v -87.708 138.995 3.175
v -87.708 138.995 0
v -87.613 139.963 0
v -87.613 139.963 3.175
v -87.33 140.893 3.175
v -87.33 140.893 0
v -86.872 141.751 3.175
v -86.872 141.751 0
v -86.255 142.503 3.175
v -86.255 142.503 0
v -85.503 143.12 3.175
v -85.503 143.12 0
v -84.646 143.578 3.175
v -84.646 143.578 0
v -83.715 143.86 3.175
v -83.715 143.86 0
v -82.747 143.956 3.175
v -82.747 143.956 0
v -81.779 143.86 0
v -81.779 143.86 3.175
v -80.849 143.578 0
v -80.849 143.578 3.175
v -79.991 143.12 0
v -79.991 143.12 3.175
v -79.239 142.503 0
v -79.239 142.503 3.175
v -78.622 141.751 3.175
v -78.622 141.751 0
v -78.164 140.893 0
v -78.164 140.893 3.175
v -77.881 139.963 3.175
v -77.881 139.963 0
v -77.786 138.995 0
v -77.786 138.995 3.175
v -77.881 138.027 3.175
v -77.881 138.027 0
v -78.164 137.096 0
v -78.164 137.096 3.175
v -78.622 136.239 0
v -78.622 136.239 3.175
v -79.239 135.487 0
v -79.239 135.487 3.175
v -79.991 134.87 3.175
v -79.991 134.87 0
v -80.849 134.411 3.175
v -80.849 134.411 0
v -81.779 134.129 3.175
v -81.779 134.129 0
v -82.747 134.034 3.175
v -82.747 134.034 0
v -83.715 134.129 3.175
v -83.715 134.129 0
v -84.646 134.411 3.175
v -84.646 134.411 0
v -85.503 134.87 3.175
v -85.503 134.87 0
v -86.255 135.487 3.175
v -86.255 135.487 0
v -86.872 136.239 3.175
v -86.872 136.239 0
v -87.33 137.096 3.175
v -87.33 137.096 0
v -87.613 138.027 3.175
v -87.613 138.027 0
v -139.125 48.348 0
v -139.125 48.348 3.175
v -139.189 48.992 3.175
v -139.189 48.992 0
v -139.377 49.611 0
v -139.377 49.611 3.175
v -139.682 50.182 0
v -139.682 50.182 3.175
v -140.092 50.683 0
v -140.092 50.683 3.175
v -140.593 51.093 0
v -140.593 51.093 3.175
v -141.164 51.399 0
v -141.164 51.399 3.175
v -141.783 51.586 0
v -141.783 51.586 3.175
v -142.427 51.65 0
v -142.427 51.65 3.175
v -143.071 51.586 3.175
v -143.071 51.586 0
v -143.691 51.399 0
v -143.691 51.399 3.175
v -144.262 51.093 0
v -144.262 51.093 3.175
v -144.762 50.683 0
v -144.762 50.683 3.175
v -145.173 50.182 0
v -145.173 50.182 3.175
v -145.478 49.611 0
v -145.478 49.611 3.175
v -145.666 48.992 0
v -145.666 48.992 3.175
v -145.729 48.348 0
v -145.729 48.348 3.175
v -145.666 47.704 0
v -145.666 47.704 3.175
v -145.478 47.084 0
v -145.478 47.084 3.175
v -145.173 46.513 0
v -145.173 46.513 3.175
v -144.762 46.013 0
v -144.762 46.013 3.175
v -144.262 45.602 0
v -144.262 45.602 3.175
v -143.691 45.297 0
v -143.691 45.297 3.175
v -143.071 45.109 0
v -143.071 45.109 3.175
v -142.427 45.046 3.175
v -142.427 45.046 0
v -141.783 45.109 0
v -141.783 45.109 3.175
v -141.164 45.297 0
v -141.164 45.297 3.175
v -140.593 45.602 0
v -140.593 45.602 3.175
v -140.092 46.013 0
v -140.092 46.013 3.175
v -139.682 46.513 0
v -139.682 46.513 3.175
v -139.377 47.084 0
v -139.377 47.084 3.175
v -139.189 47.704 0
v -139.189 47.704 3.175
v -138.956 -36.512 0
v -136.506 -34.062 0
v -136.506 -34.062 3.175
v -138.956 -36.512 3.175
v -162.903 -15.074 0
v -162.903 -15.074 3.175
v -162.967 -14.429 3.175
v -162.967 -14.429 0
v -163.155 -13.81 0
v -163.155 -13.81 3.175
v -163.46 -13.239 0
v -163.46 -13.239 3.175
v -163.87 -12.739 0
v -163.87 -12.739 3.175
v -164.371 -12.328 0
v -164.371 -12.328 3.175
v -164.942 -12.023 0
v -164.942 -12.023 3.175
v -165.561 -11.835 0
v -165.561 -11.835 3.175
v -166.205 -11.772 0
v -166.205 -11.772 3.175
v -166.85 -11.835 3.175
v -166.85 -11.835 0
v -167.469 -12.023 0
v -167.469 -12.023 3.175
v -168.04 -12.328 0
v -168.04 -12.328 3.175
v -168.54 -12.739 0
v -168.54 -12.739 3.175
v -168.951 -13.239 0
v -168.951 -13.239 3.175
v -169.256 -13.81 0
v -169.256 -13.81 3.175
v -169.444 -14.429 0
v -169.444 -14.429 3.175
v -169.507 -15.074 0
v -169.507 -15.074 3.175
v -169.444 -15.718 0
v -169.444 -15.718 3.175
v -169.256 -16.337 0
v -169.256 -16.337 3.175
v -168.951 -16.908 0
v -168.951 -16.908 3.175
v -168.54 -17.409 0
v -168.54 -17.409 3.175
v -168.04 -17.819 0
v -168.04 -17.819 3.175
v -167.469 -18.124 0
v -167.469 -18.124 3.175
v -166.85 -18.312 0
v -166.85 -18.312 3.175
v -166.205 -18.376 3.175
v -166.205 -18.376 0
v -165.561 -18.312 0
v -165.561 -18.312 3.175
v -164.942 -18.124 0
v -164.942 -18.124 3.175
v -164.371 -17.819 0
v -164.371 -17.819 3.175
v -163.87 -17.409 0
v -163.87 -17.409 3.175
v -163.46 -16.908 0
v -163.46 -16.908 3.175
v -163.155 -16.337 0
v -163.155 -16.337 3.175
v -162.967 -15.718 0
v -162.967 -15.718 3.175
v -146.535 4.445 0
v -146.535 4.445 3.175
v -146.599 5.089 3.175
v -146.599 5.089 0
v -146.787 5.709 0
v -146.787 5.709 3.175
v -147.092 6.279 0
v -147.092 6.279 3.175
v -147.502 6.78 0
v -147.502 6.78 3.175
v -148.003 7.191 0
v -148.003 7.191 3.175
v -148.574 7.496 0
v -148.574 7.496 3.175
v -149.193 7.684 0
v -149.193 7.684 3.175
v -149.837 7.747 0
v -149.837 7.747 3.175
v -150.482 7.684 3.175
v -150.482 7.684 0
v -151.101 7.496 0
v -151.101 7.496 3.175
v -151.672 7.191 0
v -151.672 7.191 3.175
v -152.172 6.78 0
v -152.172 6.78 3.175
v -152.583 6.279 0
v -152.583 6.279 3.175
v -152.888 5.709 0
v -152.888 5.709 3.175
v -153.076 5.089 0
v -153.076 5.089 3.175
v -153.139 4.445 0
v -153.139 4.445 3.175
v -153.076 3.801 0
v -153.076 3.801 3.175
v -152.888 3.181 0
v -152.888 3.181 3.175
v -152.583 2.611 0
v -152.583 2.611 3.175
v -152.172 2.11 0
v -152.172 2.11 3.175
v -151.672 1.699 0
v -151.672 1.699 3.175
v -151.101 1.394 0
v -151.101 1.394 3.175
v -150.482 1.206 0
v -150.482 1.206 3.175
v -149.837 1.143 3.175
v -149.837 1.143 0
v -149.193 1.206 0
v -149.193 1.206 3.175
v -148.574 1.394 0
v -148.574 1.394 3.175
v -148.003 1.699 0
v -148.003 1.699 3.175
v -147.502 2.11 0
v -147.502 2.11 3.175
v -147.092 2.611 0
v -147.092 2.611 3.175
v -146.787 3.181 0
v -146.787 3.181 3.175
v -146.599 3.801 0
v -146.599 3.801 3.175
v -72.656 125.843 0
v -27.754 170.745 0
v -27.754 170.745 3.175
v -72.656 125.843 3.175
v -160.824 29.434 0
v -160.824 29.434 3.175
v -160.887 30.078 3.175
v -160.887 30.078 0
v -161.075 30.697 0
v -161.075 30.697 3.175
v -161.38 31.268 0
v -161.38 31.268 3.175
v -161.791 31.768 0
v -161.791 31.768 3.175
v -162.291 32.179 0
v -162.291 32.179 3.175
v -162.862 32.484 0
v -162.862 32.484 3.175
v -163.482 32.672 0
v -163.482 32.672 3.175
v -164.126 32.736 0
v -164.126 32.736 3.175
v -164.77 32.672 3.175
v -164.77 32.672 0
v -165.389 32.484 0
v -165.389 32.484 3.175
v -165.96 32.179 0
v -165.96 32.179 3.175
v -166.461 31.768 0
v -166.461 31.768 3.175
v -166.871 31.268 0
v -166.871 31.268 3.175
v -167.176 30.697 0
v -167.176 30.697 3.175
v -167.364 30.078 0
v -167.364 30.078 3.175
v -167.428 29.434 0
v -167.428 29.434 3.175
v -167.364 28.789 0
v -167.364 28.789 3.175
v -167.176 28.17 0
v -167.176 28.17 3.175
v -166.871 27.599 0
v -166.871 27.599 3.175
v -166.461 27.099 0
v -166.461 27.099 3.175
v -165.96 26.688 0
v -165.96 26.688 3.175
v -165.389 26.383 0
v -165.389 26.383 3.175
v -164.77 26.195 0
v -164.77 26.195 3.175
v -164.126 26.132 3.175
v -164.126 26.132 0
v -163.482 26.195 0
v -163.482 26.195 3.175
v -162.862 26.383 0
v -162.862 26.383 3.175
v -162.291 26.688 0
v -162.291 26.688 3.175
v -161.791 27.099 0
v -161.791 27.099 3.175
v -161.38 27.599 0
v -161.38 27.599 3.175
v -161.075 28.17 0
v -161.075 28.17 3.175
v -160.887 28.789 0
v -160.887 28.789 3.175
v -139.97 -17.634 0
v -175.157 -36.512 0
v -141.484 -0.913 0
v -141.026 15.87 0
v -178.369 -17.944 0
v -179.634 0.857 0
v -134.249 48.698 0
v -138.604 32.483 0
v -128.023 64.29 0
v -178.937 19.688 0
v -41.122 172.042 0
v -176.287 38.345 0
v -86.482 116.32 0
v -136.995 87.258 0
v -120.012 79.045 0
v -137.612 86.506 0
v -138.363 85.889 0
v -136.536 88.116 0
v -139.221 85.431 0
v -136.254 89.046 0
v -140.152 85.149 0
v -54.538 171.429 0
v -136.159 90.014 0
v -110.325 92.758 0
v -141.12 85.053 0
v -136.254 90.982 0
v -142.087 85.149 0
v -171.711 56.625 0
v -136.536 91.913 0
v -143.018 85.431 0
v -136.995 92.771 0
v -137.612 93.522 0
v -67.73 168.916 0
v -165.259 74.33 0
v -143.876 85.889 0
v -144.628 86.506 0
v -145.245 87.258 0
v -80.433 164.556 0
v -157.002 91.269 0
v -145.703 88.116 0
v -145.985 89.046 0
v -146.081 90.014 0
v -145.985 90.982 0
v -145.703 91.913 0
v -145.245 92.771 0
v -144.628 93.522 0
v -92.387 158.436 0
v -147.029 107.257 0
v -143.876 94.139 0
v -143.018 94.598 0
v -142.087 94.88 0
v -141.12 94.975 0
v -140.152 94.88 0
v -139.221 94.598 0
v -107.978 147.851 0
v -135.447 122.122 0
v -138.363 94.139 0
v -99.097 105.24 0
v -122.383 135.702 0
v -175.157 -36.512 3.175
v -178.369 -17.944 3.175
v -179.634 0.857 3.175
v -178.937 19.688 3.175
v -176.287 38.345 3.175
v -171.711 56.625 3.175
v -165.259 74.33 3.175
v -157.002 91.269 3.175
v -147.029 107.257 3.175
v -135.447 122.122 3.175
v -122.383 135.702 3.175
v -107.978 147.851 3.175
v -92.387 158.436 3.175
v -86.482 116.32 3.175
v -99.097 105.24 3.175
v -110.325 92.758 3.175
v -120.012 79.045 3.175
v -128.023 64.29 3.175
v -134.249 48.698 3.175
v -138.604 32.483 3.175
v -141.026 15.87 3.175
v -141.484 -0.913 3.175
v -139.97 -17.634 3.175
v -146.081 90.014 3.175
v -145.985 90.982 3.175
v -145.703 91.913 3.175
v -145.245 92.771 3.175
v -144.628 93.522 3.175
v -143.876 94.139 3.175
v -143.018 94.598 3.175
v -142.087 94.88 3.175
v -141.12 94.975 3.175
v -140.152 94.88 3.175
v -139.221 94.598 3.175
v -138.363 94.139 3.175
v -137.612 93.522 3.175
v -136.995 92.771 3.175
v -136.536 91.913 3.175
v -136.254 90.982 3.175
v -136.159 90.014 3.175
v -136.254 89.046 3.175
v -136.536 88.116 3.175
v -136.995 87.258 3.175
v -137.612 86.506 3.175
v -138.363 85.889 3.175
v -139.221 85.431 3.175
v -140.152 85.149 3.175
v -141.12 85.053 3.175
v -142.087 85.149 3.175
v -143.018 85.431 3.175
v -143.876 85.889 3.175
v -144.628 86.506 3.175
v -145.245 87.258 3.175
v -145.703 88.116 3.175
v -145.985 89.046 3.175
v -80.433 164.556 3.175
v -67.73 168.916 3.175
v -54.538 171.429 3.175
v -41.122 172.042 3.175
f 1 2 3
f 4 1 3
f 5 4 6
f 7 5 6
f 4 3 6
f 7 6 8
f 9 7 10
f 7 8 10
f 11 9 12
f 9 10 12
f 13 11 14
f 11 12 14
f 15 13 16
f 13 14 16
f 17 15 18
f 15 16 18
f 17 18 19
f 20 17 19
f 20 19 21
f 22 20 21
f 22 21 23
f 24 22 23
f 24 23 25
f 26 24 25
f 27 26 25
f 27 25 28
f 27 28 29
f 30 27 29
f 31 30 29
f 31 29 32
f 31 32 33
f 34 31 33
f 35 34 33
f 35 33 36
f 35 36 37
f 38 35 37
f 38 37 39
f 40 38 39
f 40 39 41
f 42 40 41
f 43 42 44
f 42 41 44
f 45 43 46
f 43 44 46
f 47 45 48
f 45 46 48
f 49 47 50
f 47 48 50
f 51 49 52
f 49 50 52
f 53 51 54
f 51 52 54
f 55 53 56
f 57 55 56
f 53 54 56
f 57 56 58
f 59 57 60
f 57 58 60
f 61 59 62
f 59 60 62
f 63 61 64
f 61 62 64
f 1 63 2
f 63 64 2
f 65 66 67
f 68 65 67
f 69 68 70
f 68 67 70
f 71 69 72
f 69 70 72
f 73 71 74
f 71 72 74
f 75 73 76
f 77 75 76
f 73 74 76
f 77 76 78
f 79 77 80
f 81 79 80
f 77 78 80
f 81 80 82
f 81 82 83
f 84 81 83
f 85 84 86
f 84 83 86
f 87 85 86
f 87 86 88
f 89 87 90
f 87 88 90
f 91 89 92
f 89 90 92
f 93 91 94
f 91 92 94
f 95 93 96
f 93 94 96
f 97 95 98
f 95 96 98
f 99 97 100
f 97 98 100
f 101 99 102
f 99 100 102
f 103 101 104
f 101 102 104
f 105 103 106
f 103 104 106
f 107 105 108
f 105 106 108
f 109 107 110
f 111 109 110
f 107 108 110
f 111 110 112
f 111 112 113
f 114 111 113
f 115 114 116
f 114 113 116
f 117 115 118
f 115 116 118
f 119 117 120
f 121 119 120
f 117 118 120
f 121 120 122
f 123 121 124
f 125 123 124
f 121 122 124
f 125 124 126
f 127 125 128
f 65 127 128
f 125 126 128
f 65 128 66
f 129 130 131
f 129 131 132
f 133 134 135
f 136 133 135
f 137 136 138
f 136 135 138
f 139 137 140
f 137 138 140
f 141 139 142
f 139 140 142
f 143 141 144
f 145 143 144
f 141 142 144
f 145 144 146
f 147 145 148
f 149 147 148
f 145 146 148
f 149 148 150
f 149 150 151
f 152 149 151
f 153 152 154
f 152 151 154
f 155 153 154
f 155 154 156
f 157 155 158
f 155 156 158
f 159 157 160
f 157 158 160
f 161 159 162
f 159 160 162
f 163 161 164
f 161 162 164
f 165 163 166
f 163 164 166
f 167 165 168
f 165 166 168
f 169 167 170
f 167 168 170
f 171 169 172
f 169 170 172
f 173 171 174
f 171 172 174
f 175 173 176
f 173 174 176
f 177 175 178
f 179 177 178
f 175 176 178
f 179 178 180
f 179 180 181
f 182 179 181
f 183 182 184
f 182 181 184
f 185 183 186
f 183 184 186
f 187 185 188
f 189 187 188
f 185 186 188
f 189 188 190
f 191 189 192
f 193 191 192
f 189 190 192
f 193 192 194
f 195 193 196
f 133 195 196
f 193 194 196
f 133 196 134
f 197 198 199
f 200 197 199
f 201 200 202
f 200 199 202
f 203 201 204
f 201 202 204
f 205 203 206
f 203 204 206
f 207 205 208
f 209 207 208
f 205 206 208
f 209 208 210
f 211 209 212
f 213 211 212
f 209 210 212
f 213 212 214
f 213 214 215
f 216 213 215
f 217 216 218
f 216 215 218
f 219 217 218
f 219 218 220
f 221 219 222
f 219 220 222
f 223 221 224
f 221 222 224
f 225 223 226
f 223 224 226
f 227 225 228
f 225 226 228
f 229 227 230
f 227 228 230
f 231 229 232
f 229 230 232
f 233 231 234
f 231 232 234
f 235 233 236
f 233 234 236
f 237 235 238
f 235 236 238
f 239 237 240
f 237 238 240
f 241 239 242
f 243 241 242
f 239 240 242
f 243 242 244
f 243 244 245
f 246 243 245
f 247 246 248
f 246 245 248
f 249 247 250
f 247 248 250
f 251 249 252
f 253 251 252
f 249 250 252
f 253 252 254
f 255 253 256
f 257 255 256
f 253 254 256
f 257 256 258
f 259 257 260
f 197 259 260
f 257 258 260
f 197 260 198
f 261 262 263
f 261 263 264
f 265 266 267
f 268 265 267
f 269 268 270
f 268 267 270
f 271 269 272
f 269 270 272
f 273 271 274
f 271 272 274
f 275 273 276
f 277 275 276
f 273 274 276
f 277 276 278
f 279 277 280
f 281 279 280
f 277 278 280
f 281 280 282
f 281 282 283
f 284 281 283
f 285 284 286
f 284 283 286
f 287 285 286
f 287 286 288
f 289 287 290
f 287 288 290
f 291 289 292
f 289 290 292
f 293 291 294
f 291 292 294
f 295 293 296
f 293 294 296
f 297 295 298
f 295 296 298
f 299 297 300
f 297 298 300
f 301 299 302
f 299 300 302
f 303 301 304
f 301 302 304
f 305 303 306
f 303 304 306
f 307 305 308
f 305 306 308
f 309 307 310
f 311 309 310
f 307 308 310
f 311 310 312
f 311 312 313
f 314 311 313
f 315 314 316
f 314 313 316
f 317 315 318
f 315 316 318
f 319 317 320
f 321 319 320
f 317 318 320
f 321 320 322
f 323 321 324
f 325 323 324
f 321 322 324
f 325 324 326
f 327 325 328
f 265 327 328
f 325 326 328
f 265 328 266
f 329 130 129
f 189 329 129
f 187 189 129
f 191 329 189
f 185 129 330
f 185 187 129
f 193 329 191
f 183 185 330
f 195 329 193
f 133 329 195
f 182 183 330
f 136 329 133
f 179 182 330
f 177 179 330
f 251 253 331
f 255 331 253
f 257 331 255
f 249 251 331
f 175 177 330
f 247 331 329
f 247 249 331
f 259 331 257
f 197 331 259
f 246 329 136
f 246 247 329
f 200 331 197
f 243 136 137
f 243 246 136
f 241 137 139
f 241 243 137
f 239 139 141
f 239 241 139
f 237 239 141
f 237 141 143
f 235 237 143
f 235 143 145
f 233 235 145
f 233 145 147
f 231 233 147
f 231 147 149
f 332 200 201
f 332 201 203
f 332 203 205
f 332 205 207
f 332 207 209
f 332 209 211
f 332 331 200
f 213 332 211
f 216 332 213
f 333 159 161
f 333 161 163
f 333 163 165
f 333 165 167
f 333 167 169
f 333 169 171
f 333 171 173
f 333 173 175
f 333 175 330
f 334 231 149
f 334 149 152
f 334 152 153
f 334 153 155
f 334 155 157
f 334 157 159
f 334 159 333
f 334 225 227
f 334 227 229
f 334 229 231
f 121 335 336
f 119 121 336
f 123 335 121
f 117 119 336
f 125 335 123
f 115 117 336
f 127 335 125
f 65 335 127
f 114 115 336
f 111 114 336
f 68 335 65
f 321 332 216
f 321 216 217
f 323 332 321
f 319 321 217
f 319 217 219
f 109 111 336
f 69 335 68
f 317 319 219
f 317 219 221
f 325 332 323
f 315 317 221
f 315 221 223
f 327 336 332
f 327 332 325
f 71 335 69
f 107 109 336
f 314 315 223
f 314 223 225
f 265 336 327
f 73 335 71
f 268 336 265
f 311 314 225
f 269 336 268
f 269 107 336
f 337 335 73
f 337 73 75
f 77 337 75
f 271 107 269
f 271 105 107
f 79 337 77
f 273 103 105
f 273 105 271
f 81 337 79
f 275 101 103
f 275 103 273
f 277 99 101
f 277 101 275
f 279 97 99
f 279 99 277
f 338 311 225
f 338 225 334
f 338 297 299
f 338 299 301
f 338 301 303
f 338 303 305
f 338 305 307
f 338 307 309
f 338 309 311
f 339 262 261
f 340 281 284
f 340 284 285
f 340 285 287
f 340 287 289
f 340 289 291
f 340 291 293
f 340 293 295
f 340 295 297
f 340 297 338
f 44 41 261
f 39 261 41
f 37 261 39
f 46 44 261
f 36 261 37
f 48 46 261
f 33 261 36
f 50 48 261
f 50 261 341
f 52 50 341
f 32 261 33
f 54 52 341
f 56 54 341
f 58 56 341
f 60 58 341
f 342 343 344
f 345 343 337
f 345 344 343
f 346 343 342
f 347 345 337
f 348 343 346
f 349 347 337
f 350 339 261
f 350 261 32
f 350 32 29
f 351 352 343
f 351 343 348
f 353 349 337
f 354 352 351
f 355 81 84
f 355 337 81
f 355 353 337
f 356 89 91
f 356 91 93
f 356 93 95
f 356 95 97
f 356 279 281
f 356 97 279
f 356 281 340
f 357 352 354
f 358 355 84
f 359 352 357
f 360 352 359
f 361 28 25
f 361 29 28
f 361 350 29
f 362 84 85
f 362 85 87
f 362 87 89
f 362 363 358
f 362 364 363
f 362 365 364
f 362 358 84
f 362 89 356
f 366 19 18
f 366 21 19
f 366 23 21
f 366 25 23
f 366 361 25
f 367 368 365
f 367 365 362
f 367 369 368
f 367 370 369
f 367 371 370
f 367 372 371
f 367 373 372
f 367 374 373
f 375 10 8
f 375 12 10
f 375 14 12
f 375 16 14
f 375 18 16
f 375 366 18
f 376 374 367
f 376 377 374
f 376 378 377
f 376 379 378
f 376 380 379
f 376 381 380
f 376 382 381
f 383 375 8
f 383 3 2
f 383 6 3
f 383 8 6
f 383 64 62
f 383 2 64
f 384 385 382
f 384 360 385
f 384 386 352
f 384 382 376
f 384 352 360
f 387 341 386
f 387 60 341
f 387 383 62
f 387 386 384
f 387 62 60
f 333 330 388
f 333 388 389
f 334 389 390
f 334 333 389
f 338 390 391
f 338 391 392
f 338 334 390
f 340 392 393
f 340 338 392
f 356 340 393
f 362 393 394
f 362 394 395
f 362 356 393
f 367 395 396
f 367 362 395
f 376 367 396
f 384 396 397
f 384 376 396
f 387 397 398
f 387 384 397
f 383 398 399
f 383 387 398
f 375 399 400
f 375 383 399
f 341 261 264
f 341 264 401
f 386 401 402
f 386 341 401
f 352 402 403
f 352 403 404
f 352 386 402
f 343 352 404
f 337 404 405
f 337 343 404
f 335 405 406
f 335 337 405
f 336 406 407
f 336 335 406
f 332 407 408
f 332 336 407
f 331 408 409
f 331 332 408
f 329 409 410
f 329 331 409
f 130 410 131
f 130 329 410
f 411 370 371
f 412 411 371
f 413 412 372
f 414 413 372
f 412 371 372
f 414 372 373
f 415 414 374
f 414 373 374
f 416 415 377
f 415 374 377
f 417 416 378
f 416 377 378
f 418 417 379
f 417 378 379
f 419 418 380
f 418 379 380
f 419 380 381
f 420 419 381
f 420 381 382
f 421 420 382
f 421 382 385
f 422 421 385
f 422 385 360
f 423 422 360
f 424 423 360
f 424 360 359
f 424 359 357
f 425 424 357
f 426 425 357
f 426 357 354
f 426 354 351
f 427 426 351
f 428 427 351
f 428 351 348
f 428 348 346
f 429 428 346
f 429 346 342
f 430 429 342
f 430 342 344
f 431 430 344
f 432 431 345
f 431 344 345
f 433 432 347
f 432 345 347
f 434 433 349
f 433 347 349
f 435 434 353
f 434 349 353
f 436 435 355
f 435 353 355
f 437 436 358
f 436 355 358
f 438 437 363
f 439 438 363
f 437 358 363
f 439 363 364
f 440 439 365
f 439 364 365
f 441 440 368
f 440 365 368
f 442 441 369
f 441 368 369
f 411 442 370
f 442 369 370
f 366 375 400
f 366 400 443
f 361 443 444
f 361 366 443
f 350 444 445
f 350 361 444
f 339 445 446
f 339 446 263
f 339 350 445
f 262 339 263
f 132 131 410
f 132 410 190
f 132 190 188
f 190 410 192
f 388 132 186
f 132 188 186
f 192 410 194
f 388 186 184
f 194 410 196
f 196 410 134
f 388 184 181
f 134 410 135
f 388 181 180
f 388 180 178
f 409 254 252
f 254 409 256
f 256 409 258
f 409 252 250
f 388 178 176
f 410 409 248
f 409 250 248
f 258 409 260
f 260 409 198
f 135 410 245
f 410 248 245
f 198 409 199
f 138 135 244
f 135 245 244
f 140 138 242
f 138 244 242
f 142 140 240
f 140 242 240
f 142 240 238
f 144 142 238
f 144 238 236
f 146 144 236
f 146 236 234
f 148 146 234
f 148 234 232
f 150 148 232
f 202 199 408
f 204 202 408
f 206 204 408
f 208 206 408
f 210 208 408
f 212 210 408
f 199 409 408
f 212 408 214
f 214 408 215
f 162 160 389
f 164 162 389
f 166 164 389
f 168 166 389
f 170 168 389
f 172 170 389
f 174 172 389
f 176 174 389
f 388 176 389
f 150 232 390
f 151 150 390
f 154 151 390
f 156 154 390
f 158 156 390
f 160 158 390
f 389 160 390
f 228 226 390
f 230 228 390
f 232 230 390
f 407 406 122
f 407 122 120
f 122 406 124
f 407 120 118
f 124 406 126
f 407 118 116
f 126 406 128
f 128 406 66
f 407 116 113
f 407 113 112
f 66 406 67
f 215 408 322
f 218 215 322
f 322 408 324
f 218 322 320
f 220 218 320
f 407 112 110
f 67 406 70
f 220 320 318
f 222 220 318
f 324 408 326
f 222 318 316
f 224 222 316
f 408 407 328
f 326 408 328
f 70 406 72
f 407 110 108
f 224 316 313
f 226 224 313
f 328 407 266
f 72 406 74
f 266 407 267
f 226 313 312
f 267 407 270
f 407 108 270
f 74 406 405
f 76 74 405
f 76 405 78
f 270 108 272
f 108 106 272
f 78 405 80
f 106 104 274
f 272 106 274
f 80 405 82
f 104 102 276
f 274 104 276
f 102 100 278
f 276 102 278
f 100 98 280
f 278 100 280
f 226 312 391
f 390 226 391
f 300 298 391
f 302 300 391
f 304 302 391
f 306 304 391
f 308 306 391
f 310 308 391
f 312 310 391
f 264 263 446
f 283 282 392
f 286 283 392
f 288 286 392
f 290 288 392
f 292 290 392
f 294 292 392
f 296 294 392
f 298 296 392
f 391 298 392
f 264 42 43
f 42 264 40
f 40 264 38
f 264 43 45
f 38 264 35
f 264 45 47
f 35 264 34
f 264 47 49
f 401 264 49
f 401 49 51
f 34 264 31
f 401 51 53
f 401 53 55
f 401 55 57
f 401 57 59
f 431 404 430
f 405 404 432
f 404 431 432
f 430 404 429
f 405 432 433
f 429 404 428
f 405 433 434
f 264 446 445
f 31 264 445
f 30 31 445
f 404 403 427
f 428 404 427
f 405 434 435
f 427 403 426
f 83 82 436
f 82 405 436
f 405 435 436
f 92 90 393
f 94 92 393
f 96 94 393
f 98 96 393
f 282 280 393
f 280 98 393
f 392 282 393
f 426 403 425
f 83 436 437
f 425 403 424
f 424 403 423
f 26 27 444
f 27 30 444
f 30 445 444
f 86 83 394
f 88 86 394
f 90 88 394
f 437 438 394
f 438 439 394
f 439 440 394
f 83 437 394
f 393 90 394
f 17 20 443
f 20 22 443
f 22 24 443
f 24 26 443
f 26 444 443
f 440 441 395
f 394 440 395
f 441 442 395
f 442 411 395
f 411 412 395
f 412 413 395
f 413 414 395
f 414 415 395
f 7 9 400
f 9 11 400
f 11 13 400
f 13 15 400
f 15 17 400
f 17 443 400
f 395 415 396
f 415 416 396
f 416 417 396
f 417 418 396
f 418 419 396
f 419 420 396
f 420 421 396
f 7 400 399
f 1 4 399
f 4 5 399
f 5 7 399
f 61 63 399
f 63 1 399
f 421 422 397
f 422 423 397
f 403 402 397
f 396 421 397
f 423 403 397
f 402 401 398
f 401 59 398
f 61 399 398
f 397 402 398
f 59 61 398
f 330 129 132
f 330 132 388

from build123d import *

# Parameters (mm, degrees)
BOSS_EXTRUDE1_DEPTH              = 3.175
SKETCH2_R                        = 3.302
CUT_EXTRUDE1_DEPTH               = 3.175
SKETCH4_R                        = 3.302
CUT_EXTRUDE2_DEPTH               = 3.175
F_25_64_0_39063_DIAMETER_HOLE1_D = 9.922002


with BuildPart() as part:
    # Sketch1 → Boss-Extrude1 (new body)
    with BuildSketch(Plane.XY):
        with BuildLine():
            Line((-138.956026155, -36.5125), (-175.156764378, -36.5125))
            ThreePointArc((-175.156764378, -36.5125), (-165.259458004, 74.330287718), (-92.387479089, 158.435905553))
            ThreePointArc((-92.387479089, 158.435905553), (-61.178796261, 170.407509665), (-27.754441861, 170.74473641))
            Line((-27.754441861, 170.74473641), (-72.655722467, 125.843455804))
            ThreePointArc((-72.655722467, 125.843455804), (-131.365317745, 56.585646012), (-136.505752305, -34.06222615))
            Line((-136.505752305, -34.06222615), (-138.956026155, -36.5125))
        make_face()
    extrude(amount=BOSS_EXTRUDE1_DEPTH)

    # Sketch2 → Cut-Extrude1 (cut)
    with BuildSketch(Plane.XY.offset(3.175)):
        with Locations((-142.427155303, 48.347866959)):
            Circle(SKETCH2_R)
        with Locations((-149.837364131, 4.445)):
            Circle(SKETCH2_R)
    extrude(amount=-CUT_EXTRUDE1_DEPTH, mode=Mode.SUBTRACT)

    # Sketch4 → Cut-Extrude2 (cut)
    with BuildSketch(Plane.XY.offset(3.175)):
        with Locations((-164.125827505, 29.433503815)):
            Circle(SKETCH4_R)
        with Locations((-166.205357894, -15.073647178)):
            Circle(SKETCH4_R)
    extrude(amount=-CUT_EXTRUDE2_DEPTH, mode=Mode.SUBTRACT)

    # 25/64 (0.39063) Diameter Hole1 (through all)
    with Locations(Plane.XY.offset(3.175)):
        with Locations((-82.747055002, 138.99473641), (-141.119641567, 90.014320551)):
            Hole(F_25_64_0_39063_DIAMETER_HOLE1_D / 2)


solid = part.part
